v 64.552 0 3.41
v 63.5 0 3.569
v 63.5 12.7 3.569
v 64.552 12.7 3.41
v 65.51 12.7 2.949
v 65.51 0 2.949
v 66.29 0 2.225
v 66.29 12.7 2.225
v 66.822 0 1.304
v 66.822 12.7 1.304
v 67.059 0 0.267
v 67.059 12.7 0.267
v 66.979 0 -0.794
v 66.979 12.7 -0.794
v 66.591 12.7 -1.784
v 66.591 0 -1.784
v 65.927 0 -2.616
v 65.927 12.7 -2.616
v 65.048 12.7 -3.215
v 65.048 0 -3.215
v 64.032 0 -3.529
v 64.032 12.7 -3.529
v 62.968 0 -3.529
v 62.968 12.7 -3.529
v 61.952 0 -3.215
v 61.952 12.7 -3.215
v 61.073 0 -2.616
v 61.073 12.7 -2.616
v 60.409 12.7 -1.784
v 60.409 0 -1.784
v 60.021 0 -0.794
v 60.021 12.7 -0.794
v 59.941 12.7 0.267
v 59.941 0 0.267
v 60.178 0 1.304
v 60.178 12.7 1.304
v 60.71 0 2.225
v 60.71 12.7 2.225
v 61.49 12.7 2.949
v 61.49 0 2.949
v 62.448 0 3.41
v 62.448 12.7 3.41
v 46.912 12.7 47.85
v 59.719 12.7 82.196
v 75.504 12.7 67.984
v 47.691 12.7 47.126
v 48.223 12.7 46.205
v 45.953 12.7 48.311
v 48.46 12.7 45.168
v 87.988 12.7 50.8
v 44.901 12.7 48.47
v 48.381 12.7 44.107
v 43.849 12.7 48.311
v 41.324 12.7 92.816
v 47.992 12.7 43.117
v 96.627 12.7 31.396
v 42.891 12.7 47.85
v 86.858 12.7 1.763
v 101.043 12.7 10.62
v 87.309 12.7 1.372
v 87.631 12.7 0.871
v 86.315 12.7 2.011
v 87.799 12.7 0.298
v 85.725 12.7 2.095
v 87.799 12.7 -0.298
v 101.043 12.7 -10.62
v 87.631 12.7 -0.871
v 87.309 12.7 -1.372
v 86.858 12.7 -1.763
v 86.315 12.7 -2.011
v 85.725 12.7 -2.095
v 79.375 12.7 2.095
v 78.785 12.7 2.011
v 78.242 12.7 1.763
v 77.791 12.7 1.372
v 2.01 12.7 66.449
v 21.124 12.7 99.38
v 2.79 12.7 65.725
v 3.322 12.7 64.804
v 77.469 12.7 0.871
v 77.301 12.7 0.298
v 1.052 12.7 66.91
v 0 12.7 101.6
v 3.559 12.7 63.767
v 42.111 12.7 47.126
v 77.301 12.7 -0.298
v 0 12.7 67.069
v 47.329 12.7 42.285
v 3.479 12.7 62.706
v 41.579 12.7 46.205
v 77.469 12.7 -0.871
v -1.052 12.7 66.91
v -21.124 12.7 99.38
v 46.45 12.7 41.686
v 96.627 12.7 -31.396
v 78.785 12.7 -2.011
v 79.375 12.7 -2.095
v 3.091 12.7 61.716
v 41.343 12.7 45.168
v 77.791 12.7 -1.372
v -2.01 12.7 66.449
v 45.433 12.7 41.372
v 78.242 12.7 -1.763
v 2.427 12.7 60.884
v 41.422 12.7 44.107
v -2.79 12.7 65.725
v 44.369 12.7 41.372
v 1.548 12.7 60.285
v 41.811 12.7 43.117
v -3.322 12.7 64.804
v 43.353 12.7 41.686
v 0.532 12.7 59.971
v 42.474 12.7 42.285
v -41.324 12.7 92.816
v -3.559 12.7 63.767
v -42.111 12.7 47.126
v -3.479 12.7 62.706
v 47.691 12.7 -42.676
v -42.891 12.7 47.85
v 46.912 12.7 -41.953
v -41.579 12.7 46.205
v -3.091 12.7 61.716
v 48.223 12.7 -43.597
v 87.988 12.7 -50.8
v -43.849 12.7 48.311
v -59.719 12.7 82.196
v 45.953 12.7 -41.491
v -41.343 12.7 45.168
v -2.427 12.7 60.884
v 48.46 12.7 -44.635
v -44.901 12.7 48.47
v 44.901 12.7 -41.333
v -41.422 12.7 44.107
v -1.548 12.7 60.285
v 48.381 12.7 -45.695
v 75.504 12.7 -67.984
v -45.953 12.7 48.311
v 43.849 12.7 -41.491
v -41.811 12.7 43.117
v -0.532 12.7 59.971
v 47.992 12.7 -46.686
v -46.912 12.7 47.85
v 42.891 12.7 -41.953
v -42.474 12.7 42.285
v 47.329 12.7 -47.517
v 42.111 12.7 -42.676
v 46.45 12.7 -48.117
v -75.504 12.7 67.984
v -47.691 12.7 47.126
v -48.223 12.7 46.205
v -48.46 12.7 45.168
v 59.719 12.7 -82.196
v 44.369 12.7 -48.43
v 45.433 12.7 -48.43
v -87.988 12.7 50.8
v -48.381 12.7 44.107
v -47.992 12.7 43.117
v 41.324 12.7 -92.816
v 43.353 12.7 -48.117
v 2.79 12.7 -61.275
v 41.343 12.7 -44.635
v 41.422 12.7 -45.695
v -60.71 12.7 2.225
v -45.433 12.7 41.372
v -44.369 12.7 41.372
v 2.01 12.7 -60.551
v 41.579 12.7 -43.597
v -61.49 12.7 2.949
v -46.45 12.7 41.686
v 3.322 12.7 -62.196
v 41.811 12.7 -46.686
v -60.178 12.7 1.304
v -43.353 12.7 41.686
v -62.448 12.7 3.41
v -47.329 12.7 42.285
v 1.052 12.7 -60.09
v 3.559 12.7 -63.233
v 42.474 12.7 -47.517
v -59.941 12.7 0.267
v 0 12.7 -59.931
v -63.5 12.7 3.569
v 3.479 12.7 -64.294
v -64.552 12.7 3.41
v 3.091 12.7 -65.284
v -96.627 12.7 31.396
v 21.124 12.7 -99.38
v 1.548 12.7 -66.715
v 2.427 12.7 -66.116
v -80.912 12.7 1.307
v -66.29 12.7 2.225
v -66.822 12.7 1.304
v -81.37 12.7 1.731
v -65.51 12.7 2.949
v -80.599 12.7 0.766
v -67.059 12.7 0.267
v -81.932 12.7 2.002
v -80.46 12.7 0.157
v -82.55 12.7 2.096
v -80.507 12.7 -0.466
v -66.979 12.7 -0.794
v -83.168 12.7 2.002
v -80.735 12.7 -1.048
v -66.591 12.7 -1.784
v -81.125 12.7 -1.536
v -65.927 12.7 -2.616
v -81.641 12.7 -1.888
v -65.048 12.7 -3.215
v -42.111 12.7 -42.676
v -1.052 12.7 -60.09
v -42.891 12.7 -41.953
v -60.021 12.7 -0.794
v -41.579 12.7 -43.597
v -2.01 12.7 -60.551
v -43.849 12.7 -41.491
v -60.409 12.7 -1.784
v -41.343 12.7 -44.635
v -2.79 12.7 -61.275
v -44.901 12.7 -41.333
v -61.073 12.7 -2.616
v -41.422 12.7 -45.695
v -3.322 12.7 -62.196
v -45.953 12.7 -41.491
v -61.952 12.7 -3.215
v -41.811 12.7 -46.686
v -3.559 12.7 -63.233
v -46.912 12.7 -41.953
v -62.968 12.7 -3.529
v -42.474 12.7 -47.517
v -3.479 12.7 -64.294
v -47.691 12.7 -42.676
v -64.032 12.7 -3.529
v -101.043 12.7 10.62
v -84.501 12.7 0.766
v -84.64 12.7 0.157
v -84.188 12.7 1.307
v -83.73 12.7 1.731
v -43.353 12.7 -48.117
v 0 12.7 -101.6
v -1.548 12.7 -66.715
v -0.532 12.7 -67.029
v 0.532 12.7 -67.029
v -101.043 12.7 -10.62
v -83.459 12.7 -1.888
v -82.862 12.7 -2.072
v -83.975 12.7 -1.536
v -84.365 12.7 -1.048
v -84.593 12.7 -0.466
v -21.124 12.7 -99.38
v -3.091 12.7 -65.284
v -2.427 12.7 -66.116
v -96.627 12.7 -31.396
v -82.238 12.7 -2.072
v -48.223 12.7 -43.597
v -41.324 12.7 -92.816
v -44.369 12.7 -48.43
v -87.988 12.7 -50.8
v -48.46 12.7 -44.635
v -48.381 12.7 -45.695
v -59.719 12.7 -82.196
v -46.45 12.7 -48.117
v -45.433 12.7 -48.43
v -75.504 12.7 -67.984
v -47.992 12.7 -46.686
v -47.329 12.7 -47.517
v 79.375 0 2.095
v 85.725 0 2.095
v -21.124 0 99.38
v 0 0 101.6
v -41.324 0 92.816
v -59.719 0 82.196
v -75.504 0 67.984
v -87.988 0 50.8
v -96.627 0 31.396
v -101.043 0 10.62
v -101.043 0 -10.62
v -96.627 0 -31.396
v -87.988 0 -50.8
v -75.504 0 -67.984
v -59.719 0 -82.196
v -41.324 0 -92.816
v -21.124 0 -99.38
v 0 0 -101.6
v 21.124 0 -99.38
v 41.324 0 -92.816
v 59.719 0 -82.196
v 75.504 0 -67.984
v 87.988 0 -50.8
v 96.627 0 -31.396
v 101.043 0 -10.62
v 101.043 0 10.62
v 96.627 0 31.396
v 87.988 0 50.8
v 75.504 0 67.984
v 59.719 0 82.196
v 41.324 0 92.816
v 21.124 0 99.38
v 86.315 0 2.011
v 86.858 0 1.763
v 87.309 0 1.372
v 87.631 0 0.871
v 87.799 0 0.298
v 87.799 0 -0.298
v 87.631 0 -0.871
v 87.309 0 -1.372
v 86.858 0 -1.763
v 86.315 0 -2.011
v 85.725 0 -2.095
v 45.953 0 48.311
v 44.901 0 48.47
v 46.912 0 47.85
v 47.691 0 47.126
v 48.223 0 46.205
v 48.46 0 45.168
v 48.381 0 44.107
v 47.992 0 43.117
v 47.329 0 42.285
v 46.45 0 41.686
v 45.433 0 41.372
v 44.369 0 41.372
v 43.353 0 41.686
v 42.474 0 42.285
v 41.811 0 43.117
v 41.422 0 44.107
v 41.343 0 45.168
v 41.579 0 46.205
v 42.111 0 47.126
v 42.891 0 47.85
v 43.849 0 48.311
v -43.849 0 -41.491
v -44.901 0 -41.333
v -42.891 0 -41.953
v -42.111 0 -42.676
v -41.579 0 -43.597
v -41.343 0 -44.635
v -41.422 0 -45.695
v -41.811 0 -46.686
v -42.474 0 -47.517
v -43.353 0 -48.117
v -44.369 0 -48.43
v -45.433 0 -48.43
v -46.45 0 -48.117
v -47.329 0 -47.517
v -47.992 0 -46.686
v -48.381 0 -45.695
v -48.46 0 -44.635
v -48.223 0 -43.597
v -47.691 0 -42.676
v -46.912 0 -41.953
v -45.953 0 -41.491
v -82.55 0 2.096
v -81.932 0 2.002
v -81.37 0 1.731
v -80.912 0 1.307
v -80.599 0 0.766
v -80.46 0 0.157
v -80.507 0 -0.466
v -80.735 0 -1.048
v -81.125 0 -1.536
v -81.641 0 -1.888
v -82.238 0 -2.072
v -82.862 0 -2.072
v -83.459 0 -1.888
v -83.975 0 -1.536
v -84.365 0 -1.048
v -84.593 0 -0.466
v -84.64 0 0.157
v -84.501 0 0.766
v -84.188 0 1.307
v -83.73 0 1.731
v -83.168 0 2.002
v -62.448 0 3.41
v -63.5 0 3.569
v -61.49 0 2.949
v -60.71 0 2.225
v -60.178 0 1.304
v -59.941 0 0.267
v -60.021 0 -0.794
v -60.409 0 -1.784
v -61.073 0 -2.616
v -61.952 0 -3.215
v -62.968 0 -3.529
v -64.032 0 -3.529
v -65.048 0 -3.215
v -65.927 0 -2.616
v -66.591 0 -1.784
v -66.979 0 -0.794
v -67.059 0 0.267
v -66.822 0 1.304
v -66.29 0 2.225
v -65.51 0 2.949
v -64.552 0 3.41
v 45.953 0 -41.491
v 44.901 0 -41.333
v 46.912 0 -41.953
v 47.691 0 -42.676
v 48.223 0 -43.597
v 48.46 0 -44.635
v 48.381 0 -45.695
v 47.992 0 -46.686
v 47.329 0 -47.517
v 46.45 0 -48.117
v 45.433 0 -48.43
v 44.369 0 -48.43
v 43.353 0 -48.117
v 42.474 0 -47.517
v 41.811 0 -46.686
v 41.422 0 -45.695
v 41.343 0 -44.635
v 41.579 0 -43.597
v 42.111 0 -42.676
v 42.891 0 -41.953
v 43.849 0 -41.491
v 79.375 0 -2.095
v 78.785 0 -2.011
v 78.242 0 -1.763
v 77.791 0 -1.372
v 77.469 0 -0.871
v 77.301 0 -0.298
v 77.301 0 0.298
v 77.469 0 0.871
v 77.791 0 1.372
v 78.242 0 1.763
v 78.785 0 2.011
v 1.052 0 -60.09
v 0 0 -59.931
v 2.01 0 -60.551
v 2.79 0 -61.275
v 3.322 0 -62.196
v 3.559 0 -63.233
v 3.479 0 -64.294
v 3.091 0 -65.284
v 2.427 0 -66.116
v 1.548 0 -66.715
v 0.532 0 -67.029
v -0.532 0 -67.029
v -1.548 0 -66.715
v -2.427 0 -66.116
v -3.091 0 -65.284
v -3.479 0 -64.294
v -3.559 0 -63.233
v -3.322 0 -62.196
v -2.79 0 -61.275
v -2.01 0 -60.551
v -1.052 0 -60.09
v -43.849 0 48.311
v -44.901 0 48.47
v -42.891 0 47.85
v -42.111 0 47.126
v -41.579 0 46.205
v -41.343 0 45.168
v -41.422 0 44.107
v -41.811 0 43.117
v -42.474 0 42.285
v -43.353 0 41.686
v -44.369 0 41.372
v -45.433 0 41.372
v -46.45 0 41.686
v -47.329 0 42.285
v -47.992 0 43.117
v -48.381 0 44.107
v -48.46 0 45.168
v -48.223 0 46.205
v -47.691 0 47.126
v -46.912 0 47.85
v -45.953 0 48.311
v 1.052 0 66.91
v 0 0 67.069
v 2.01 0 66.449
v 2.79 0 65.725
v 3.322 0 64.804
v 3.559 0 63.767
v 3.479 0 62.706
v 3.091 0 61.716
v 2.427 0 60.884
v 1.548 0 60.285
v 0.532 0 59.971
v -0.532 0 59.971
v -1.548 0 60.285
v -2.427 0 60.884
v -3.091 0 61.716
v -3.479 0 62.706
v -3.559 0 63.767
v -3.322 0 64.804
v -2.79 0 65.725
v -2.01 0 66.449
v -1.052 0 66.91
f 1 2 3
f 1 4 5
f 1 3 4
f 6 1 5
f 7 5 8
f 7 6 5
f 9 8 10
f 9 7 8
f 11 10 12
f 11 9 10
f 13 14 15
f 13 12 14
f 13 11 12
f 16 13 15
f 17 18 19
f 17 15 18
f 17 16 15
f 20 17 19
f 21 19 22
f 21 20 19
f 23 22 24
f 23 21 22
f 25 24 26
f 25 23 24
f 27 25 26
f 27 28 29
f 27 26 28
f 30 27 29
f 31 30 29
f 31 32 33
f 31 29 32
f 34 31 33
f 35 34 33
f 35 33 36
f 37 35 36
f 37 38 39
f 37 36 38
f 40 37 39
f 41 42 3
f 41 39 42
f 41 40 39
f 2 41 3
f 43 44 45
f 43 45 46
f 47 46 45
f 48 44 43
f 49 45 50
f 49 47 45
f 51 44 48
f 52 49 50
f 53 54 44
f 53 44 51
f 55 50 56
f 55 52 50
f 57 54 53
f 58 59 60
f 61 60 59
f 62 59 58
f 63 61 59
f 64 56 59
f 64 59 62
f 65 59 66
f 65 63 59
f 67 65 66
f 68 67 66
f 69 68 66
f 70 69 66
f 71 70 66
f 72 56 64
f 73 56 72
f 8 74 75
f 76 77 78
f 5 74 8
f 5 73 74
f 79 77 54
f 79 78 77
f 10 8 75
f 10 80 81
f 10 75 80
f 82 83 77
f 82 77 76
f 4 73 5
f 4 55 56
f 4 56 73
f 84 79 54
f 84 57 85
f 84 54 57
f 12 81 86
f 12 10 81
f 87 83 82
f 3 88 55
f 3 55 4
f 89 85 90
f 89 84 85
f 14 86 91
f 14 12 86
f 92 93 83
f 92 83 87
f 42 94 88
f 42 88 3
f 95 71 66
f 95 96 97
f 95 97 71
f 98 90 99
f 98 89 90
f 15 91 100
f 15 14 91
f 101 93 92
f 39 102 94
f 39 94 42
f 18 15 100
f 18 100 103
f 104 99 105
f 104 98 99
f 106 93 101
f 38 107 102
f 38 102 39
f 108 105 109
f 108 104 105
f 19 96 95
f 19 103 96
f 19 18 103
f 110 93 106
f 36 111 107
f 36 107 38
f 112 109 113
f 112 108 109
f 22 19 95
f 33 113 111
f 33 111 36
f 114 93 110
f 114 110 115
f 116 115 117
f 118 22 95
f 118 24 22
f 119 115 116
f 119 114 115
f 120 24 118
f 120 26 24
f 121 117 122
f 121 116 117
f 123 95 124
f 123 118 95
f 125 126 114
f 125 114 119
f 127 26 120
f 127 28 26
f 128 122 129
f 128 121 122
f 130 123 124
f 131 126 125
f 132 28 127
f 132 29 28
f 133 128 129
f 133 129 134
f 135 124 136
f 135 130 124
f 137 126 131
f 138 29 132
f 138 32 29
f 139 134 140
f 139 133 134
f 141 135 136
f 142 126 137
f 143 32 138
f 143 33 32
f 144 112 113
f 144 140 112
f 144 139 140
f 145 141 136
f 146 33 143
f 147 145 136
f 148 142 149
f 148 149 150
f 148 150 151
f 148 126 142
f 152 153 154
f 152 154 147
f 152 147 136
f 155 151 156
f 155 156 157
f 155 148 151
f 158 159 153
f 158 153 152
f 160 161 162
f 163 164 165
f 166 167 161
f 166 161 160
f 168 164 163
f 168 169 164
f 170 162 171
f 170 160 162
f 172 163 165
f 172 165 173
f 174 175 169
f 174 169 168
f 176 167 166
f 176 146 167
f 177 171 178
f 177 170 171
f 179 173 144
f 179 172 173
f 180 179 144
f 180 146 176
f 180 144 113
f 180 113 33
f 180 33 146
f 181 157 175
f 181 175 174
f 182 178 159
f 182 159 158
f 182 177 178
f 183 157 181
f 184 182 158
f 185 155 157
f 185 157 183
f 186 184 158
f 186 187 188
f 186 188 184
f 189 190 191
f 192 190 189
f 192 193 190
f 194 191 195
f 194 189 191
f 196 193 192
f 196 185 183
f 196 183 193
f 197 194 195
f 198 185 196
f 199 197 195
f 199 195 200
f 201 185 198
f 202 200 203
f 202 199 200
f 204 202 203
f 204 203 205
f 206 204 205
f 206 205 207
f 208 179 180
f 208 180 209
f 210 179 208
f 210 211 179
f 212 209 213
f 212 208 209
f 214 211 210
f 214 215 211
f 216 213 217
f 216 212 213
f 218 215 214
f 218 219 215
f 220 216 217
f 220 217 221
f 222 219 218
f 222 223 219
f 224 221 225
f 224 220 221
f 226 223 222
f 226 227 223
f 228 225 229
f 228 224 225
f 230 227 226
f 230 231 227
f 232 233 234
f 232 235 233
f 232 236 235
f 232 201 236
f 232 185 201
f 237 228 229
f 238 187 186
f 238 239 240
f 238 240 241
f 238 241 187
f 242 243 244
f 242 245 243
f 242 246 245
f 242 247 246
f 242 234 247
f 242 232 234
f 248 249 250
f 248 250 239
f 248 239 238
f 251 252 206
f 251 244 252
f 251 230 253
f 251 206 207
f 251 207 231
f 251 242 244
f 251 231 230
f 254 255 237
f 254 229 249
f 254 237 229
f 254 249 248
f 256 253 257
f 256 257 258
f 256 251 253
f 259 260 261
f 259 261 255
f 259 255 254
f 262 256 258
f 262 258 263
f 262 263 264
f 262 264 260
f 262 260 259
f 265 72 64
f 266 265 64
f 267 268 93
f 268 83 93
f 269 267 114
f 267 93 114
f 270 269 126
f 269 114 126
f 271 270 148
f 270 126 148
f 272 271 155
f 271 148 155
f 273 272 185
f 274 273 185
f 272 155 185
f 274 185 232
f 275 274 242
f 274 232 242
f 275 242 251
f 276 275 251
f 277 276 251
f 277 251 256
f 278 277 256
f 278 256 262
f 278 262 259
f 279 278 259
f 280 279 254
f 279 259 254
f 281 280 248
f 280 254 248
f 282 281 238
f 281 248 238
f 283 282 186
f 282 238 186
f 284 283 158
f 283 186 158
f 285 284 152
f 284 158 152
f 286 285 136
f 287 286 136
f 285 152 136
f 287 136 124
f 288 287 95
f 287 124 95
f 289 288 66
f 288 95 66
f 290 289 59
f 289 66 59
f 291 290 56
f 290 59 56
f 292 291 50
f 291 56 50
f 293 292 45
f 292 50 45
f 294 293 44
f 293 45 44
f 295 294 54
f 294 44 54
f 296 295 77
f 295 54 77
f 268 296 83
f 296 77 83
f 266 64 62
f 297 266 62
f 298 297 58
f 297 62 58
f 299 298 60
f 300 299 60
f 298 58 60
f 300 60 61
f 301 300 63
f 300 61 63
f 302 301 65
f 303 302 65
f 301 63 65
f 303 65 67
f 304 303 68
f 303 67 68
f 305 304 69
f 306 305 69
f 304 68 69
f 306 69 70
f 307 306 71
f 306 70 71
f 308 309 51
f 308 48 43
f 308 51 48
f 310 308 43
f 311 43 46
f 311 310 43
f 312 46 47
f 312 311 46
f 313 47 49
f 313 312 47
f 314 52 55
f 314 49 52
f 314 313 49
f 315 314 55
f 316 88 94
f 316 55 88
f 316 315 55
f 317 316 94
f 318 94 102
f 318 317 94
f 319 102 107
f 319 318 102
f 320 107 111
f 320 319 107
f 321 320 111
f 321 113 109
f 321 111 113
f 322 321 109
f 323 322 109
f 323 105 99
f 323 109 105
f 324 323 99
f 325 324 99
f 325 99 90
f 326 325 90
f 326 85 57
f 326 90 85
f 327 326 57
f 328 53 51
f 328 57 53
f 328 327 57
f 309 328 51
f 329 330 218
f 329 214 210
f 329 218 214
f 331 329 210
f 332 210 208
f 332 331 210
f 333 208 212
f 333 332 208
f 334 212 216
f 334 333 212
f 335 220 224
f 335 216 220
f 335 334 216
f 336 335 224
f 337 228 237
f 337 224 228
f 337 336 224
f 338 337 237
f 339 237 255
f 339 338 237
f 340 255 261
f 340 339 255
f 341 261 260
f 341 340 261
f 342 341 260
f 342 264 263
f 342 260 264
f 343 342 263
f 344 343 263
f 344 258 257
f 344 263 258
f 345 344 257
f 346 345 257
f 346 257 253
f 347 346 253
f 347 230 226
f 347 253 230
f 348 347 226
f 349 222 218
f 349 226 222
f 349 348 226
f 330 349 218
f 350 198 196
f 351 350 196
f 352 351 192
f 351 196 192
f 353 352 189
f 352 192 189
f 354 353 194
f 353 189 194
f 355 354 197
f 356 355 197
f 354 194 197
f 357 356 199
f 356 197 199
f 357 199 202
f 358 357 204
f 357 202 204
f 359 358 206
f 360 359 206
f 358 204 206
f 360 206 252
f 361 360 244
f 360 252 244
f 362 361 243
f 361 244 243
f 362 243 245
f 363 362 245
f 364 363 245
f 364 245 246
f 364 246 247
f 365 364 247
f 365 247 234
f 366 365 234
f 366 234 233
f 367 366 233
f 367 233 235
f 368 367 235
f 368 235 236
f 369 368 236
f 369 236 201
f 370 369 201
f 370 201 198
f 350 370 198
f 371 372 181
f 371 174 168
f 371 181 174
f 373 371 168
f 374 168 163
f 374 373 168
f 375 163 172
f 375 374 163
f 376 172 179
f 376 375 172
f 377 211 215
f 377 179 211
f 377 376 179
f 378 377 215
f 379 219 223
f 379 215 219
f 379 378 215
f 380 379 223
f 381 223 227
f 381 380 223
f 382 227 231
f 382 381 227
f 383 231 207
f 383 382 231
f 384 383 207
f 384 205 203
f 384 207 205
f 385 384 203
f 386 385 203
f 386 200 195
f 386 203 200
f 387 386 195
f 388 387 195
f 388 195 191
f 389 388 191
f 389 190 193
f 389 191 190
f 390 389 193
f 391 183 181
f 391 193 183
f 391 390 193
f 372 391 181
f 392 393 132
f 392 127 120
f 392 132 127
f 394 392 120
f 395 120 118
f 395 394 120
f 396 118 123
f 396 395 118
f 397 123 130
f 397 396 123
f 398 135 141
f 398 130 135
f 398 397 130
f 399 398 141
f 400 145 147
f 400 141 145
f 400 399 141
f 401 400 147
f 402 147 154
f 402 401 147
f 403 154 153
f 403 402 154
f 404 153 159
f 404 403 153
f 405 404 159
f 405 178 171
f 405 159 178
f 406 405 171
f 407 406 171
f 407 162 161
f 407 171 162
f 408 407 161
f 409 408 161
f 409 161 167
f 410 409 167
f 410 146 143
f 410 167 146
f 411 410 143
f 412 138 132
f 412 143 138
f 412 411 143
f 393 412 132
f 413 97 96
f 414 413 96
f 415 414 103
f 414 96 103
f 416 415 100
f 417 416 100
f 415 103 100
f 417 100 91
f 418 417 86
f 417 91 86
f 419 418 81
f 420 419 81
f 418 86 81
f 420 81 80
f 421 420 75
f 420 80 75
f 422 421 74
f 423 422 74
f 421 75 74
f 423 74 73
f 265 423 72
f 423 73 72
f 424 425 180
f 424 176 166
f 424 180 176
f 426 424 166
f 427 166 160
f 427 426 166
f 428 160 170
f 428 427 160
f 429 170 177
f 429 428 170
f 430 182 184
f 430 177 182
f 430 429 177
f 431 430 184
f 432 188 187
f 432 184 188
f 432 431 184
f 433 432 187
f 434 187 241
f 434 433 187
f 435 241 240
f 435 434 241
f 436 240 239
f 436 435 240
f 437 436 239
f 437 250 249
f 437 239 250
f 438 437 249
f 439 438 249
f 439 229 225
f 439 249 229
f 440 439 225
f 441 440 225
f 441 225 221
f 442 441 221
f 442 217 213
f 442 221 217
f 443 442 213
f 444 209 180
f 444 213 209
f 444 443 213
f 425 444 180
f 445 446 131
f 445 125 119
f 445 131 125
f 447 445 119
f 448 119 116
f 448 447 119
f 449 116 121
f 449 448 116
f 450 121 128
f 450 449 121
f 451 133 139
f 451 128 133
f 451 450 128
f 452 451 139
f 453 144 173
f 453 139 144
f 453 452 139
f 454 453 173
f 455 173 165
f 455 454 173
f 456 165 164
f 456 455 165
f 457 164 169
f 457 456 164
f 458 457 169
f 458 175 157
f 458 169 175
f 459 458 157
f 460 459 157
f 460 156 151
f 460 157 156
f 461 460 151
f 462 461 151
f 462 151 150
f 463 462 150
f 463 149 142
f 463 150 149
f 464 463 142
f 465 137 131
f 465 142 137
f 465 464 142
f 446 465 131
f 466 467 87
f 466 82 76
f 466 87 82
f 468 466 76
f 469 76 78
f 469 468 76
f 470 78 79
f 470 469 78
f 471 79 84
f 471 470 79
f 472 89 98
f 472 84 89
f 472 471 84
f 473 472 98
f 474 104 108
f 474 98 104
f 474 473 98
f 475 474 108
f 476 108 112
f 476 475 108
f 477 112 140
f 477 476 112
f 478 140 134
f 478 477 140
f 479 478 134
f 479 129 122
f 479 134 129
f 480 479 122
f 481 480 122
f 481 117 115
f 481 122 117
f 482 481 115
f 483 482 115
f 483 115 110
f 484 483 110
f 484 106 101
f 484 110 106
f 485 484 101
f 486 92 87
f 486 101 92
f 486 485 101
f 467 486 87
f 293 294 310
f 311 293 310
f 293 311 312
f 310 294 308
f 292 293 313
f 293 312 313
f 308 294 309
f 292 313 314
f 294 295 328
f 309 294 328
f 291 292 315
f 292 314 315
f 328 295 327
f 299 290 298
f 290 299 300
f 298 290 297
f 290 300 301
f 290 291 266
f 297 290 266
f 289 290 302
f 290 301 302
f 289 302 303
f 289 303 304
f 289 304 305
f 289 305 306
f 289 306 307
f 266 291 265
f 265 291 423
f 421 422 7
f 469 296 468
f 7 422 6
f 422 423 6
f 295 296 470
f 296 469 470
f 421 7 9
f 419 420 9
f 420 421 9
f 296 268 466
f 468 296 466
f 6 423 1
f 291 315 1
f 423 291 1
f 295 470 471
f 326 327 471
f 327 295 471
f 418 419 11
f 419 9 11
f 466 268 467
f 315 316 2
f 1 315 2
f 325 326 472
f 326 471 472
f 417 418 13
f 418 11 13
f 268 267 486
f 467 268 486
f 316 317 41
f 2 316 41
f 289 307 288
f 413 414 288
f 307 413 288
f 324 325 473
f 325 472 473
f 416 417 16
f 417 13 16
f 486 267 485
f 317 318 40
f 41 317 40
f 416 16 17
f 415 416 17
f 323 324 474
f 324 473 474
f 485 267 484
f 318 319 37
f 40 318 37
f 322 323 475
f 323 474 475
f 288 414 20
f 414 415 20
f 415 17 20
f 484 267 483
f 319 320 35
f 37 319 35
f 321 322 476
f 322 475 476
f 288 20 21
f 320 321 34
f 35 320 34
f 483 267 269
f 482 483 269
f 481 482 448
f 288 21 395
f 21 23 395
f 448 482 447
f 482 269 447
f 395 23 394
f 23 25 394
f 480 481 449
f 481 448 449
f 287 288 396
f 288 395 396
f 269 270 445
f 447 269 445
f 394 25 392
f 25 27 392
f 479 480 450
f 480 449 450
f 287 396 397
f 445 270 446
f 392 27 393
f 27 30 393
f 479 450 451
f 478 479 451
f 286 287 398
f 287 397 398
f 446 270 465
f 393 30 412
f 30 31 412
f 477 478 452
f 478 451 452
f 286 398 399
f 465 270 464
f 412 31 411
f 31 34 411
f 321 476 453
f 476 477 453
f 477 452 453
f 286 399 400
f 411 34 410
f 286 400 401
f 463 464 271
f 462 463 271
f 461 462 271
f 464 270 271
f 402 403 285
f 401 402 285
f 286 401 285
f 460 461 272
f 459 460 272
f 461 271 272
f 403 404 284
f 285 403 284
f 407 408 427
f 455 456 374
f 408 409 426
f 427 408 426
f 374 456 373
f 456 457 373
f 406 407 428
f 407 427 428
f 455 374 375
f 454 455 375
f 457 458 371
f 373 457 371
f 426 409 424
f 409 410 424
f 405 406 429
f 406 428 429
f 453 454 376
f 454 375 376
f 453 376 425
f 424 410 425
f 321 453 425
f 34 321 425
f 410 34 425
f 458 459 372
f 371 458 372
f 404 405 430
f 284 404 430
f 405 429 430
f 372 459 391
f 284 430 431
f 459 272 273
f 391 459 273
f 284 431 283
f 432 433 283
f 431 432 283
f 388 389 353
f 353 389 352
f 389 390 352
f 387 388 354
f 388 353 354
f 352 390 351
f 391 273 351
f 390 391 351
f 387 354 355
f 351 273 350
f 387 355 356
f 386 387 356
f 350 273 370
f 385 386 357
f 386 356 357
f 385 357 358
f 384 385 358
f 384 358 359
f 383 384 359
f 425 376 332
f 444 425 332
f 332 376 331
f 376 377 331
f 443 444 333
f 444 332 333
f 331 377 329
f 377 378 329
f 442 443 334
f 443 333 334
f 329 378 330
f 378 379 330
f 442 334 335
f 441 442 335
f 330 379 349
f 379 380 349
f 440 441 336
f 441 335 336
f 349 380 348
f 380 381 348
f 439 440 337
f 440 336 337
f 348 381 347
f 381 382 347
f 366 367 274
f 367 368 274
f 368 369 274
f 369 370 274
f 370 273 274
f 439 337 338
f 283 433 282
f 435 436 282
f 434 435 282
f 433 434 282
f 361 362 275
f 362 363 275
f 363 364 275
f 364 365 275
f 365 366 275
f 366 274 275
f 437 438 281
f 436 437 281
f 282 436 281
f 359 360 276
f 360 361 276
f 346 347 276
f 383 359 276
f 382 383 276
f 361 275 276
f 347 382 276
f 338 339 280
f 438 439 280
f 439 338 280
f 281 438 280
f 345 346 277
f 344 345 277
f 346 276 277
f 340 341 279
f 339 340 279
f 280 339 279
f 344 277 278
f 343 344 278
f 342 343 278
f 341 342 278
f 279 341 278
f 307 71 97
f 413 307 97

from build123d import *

# Parameters (mm, degrees)
SKETCH1_W               = 101.6
SKETCH1_H               = 12.7
CUT_EXTRUDE1_DEPTH      = 145.244271983
CUT_EXTRUDE1_DEPTH_BACK = 145.244271983
SKETCH2_R               = 3.5687
SKETCH3_R               = 2.0955
CUT_EXTRUDE4_DEPTH      = 31.75


with BuildPart() as part:
    # Sketch1 → Revolve1 (revolve)
    with BuildSketch(Plane(origin=(0, 0, 0), x_dir=(0, 0, -1), z_dir=(1, 0, 0)), mode=Mode.PRIVATE) as revolve1_sk:
        with Locations((50.8, 6.35)):
            Rectangle(SKETCH1_W, SKETCH1_H)
    revolve(revolve1_sk.sketch.rotate(Axis((0, 46.9, 0), (0, -1, 0)), 180), axis=Axis((0, 46.9, 0), (0, -1, 0)))

    # Sketch2 → Cut-Extrude1 (cut, two sides: drawn at the far end of the back side and taken through both)
    with BuildSketch(Plane(origin=(0, 12.7, 0), x_dir=(1, 0, 0), z_dir=(0, 1, 0)).offset(-CUT_EXTRUDE1_DEPTH_BACK)):
        with Locations(Location((0, 63.5, 0), (0, 0, 270))):
            Circle(SKETCH2_R)
        with Locations(Location((44.901280605, 44.901280605, 0), (0, 0, 270))):
            Circle(SKETCH2_R)
        with Locations(Location((63.5, 0, 0), (0, 0, 270))):
            Circle(SKETCH2_R)
        with Locations(Location((44.901280605, -44.901280605, 0), (0, 0, 270))):
            Circle(SKETCH2_R)
        with Locations(Location((0, -63.5, 0), (0, 0, 270))):
            Circle(SKETCH2_R)
        with Locations(Location((-44.901280605, -44.901280605, 0), (0, 0, 270))):
            Circle(SKETCH2_R)
        with Locations(Location((-63.5, 0, 0), (0, 0, 270))):
            Circle(SKETCH2_R)
        with Locations(Location((-44.901280605, 44.901280605, 0), (0, 0, 270))):
            Circle(SKETCH2_R)
    extrude(amount=CUT_EXTRUDE1_DEPTH + CUT_EXTRUDE1_DEPTH_BACK, mode=Mode.SUBTRACT)

    # Sketch3 → Cut-Extrude4 (cut)
    with BuildSketch(Plane(origin=(0, 12.7, 0), x_dir=(1, 0, 0), z_dir=(0, 1, 0))):
        with Locations(Location((-82.55, 0, 0), (0, 0, 270))):
            Circle(SKETCH3_R)
        with BuildLine():
            Line((79.375, -2.0955), (85.725, -2.0955))
            ThreePointArc((85.725, -2.0955), (87.8205, 0), (85.725, 2.0955))
            Line((85.725, 2.0955), (79.375, 2.0955))
            ThreePointArc((79.375, 2.0955), (77.2795, 0), (79.375, -2.0955))
        make_face()
    extrude(amount=-CUT_EXTRUDE4_DEPTH, mode=Mode.SUBTRACT)


solid = part.part
